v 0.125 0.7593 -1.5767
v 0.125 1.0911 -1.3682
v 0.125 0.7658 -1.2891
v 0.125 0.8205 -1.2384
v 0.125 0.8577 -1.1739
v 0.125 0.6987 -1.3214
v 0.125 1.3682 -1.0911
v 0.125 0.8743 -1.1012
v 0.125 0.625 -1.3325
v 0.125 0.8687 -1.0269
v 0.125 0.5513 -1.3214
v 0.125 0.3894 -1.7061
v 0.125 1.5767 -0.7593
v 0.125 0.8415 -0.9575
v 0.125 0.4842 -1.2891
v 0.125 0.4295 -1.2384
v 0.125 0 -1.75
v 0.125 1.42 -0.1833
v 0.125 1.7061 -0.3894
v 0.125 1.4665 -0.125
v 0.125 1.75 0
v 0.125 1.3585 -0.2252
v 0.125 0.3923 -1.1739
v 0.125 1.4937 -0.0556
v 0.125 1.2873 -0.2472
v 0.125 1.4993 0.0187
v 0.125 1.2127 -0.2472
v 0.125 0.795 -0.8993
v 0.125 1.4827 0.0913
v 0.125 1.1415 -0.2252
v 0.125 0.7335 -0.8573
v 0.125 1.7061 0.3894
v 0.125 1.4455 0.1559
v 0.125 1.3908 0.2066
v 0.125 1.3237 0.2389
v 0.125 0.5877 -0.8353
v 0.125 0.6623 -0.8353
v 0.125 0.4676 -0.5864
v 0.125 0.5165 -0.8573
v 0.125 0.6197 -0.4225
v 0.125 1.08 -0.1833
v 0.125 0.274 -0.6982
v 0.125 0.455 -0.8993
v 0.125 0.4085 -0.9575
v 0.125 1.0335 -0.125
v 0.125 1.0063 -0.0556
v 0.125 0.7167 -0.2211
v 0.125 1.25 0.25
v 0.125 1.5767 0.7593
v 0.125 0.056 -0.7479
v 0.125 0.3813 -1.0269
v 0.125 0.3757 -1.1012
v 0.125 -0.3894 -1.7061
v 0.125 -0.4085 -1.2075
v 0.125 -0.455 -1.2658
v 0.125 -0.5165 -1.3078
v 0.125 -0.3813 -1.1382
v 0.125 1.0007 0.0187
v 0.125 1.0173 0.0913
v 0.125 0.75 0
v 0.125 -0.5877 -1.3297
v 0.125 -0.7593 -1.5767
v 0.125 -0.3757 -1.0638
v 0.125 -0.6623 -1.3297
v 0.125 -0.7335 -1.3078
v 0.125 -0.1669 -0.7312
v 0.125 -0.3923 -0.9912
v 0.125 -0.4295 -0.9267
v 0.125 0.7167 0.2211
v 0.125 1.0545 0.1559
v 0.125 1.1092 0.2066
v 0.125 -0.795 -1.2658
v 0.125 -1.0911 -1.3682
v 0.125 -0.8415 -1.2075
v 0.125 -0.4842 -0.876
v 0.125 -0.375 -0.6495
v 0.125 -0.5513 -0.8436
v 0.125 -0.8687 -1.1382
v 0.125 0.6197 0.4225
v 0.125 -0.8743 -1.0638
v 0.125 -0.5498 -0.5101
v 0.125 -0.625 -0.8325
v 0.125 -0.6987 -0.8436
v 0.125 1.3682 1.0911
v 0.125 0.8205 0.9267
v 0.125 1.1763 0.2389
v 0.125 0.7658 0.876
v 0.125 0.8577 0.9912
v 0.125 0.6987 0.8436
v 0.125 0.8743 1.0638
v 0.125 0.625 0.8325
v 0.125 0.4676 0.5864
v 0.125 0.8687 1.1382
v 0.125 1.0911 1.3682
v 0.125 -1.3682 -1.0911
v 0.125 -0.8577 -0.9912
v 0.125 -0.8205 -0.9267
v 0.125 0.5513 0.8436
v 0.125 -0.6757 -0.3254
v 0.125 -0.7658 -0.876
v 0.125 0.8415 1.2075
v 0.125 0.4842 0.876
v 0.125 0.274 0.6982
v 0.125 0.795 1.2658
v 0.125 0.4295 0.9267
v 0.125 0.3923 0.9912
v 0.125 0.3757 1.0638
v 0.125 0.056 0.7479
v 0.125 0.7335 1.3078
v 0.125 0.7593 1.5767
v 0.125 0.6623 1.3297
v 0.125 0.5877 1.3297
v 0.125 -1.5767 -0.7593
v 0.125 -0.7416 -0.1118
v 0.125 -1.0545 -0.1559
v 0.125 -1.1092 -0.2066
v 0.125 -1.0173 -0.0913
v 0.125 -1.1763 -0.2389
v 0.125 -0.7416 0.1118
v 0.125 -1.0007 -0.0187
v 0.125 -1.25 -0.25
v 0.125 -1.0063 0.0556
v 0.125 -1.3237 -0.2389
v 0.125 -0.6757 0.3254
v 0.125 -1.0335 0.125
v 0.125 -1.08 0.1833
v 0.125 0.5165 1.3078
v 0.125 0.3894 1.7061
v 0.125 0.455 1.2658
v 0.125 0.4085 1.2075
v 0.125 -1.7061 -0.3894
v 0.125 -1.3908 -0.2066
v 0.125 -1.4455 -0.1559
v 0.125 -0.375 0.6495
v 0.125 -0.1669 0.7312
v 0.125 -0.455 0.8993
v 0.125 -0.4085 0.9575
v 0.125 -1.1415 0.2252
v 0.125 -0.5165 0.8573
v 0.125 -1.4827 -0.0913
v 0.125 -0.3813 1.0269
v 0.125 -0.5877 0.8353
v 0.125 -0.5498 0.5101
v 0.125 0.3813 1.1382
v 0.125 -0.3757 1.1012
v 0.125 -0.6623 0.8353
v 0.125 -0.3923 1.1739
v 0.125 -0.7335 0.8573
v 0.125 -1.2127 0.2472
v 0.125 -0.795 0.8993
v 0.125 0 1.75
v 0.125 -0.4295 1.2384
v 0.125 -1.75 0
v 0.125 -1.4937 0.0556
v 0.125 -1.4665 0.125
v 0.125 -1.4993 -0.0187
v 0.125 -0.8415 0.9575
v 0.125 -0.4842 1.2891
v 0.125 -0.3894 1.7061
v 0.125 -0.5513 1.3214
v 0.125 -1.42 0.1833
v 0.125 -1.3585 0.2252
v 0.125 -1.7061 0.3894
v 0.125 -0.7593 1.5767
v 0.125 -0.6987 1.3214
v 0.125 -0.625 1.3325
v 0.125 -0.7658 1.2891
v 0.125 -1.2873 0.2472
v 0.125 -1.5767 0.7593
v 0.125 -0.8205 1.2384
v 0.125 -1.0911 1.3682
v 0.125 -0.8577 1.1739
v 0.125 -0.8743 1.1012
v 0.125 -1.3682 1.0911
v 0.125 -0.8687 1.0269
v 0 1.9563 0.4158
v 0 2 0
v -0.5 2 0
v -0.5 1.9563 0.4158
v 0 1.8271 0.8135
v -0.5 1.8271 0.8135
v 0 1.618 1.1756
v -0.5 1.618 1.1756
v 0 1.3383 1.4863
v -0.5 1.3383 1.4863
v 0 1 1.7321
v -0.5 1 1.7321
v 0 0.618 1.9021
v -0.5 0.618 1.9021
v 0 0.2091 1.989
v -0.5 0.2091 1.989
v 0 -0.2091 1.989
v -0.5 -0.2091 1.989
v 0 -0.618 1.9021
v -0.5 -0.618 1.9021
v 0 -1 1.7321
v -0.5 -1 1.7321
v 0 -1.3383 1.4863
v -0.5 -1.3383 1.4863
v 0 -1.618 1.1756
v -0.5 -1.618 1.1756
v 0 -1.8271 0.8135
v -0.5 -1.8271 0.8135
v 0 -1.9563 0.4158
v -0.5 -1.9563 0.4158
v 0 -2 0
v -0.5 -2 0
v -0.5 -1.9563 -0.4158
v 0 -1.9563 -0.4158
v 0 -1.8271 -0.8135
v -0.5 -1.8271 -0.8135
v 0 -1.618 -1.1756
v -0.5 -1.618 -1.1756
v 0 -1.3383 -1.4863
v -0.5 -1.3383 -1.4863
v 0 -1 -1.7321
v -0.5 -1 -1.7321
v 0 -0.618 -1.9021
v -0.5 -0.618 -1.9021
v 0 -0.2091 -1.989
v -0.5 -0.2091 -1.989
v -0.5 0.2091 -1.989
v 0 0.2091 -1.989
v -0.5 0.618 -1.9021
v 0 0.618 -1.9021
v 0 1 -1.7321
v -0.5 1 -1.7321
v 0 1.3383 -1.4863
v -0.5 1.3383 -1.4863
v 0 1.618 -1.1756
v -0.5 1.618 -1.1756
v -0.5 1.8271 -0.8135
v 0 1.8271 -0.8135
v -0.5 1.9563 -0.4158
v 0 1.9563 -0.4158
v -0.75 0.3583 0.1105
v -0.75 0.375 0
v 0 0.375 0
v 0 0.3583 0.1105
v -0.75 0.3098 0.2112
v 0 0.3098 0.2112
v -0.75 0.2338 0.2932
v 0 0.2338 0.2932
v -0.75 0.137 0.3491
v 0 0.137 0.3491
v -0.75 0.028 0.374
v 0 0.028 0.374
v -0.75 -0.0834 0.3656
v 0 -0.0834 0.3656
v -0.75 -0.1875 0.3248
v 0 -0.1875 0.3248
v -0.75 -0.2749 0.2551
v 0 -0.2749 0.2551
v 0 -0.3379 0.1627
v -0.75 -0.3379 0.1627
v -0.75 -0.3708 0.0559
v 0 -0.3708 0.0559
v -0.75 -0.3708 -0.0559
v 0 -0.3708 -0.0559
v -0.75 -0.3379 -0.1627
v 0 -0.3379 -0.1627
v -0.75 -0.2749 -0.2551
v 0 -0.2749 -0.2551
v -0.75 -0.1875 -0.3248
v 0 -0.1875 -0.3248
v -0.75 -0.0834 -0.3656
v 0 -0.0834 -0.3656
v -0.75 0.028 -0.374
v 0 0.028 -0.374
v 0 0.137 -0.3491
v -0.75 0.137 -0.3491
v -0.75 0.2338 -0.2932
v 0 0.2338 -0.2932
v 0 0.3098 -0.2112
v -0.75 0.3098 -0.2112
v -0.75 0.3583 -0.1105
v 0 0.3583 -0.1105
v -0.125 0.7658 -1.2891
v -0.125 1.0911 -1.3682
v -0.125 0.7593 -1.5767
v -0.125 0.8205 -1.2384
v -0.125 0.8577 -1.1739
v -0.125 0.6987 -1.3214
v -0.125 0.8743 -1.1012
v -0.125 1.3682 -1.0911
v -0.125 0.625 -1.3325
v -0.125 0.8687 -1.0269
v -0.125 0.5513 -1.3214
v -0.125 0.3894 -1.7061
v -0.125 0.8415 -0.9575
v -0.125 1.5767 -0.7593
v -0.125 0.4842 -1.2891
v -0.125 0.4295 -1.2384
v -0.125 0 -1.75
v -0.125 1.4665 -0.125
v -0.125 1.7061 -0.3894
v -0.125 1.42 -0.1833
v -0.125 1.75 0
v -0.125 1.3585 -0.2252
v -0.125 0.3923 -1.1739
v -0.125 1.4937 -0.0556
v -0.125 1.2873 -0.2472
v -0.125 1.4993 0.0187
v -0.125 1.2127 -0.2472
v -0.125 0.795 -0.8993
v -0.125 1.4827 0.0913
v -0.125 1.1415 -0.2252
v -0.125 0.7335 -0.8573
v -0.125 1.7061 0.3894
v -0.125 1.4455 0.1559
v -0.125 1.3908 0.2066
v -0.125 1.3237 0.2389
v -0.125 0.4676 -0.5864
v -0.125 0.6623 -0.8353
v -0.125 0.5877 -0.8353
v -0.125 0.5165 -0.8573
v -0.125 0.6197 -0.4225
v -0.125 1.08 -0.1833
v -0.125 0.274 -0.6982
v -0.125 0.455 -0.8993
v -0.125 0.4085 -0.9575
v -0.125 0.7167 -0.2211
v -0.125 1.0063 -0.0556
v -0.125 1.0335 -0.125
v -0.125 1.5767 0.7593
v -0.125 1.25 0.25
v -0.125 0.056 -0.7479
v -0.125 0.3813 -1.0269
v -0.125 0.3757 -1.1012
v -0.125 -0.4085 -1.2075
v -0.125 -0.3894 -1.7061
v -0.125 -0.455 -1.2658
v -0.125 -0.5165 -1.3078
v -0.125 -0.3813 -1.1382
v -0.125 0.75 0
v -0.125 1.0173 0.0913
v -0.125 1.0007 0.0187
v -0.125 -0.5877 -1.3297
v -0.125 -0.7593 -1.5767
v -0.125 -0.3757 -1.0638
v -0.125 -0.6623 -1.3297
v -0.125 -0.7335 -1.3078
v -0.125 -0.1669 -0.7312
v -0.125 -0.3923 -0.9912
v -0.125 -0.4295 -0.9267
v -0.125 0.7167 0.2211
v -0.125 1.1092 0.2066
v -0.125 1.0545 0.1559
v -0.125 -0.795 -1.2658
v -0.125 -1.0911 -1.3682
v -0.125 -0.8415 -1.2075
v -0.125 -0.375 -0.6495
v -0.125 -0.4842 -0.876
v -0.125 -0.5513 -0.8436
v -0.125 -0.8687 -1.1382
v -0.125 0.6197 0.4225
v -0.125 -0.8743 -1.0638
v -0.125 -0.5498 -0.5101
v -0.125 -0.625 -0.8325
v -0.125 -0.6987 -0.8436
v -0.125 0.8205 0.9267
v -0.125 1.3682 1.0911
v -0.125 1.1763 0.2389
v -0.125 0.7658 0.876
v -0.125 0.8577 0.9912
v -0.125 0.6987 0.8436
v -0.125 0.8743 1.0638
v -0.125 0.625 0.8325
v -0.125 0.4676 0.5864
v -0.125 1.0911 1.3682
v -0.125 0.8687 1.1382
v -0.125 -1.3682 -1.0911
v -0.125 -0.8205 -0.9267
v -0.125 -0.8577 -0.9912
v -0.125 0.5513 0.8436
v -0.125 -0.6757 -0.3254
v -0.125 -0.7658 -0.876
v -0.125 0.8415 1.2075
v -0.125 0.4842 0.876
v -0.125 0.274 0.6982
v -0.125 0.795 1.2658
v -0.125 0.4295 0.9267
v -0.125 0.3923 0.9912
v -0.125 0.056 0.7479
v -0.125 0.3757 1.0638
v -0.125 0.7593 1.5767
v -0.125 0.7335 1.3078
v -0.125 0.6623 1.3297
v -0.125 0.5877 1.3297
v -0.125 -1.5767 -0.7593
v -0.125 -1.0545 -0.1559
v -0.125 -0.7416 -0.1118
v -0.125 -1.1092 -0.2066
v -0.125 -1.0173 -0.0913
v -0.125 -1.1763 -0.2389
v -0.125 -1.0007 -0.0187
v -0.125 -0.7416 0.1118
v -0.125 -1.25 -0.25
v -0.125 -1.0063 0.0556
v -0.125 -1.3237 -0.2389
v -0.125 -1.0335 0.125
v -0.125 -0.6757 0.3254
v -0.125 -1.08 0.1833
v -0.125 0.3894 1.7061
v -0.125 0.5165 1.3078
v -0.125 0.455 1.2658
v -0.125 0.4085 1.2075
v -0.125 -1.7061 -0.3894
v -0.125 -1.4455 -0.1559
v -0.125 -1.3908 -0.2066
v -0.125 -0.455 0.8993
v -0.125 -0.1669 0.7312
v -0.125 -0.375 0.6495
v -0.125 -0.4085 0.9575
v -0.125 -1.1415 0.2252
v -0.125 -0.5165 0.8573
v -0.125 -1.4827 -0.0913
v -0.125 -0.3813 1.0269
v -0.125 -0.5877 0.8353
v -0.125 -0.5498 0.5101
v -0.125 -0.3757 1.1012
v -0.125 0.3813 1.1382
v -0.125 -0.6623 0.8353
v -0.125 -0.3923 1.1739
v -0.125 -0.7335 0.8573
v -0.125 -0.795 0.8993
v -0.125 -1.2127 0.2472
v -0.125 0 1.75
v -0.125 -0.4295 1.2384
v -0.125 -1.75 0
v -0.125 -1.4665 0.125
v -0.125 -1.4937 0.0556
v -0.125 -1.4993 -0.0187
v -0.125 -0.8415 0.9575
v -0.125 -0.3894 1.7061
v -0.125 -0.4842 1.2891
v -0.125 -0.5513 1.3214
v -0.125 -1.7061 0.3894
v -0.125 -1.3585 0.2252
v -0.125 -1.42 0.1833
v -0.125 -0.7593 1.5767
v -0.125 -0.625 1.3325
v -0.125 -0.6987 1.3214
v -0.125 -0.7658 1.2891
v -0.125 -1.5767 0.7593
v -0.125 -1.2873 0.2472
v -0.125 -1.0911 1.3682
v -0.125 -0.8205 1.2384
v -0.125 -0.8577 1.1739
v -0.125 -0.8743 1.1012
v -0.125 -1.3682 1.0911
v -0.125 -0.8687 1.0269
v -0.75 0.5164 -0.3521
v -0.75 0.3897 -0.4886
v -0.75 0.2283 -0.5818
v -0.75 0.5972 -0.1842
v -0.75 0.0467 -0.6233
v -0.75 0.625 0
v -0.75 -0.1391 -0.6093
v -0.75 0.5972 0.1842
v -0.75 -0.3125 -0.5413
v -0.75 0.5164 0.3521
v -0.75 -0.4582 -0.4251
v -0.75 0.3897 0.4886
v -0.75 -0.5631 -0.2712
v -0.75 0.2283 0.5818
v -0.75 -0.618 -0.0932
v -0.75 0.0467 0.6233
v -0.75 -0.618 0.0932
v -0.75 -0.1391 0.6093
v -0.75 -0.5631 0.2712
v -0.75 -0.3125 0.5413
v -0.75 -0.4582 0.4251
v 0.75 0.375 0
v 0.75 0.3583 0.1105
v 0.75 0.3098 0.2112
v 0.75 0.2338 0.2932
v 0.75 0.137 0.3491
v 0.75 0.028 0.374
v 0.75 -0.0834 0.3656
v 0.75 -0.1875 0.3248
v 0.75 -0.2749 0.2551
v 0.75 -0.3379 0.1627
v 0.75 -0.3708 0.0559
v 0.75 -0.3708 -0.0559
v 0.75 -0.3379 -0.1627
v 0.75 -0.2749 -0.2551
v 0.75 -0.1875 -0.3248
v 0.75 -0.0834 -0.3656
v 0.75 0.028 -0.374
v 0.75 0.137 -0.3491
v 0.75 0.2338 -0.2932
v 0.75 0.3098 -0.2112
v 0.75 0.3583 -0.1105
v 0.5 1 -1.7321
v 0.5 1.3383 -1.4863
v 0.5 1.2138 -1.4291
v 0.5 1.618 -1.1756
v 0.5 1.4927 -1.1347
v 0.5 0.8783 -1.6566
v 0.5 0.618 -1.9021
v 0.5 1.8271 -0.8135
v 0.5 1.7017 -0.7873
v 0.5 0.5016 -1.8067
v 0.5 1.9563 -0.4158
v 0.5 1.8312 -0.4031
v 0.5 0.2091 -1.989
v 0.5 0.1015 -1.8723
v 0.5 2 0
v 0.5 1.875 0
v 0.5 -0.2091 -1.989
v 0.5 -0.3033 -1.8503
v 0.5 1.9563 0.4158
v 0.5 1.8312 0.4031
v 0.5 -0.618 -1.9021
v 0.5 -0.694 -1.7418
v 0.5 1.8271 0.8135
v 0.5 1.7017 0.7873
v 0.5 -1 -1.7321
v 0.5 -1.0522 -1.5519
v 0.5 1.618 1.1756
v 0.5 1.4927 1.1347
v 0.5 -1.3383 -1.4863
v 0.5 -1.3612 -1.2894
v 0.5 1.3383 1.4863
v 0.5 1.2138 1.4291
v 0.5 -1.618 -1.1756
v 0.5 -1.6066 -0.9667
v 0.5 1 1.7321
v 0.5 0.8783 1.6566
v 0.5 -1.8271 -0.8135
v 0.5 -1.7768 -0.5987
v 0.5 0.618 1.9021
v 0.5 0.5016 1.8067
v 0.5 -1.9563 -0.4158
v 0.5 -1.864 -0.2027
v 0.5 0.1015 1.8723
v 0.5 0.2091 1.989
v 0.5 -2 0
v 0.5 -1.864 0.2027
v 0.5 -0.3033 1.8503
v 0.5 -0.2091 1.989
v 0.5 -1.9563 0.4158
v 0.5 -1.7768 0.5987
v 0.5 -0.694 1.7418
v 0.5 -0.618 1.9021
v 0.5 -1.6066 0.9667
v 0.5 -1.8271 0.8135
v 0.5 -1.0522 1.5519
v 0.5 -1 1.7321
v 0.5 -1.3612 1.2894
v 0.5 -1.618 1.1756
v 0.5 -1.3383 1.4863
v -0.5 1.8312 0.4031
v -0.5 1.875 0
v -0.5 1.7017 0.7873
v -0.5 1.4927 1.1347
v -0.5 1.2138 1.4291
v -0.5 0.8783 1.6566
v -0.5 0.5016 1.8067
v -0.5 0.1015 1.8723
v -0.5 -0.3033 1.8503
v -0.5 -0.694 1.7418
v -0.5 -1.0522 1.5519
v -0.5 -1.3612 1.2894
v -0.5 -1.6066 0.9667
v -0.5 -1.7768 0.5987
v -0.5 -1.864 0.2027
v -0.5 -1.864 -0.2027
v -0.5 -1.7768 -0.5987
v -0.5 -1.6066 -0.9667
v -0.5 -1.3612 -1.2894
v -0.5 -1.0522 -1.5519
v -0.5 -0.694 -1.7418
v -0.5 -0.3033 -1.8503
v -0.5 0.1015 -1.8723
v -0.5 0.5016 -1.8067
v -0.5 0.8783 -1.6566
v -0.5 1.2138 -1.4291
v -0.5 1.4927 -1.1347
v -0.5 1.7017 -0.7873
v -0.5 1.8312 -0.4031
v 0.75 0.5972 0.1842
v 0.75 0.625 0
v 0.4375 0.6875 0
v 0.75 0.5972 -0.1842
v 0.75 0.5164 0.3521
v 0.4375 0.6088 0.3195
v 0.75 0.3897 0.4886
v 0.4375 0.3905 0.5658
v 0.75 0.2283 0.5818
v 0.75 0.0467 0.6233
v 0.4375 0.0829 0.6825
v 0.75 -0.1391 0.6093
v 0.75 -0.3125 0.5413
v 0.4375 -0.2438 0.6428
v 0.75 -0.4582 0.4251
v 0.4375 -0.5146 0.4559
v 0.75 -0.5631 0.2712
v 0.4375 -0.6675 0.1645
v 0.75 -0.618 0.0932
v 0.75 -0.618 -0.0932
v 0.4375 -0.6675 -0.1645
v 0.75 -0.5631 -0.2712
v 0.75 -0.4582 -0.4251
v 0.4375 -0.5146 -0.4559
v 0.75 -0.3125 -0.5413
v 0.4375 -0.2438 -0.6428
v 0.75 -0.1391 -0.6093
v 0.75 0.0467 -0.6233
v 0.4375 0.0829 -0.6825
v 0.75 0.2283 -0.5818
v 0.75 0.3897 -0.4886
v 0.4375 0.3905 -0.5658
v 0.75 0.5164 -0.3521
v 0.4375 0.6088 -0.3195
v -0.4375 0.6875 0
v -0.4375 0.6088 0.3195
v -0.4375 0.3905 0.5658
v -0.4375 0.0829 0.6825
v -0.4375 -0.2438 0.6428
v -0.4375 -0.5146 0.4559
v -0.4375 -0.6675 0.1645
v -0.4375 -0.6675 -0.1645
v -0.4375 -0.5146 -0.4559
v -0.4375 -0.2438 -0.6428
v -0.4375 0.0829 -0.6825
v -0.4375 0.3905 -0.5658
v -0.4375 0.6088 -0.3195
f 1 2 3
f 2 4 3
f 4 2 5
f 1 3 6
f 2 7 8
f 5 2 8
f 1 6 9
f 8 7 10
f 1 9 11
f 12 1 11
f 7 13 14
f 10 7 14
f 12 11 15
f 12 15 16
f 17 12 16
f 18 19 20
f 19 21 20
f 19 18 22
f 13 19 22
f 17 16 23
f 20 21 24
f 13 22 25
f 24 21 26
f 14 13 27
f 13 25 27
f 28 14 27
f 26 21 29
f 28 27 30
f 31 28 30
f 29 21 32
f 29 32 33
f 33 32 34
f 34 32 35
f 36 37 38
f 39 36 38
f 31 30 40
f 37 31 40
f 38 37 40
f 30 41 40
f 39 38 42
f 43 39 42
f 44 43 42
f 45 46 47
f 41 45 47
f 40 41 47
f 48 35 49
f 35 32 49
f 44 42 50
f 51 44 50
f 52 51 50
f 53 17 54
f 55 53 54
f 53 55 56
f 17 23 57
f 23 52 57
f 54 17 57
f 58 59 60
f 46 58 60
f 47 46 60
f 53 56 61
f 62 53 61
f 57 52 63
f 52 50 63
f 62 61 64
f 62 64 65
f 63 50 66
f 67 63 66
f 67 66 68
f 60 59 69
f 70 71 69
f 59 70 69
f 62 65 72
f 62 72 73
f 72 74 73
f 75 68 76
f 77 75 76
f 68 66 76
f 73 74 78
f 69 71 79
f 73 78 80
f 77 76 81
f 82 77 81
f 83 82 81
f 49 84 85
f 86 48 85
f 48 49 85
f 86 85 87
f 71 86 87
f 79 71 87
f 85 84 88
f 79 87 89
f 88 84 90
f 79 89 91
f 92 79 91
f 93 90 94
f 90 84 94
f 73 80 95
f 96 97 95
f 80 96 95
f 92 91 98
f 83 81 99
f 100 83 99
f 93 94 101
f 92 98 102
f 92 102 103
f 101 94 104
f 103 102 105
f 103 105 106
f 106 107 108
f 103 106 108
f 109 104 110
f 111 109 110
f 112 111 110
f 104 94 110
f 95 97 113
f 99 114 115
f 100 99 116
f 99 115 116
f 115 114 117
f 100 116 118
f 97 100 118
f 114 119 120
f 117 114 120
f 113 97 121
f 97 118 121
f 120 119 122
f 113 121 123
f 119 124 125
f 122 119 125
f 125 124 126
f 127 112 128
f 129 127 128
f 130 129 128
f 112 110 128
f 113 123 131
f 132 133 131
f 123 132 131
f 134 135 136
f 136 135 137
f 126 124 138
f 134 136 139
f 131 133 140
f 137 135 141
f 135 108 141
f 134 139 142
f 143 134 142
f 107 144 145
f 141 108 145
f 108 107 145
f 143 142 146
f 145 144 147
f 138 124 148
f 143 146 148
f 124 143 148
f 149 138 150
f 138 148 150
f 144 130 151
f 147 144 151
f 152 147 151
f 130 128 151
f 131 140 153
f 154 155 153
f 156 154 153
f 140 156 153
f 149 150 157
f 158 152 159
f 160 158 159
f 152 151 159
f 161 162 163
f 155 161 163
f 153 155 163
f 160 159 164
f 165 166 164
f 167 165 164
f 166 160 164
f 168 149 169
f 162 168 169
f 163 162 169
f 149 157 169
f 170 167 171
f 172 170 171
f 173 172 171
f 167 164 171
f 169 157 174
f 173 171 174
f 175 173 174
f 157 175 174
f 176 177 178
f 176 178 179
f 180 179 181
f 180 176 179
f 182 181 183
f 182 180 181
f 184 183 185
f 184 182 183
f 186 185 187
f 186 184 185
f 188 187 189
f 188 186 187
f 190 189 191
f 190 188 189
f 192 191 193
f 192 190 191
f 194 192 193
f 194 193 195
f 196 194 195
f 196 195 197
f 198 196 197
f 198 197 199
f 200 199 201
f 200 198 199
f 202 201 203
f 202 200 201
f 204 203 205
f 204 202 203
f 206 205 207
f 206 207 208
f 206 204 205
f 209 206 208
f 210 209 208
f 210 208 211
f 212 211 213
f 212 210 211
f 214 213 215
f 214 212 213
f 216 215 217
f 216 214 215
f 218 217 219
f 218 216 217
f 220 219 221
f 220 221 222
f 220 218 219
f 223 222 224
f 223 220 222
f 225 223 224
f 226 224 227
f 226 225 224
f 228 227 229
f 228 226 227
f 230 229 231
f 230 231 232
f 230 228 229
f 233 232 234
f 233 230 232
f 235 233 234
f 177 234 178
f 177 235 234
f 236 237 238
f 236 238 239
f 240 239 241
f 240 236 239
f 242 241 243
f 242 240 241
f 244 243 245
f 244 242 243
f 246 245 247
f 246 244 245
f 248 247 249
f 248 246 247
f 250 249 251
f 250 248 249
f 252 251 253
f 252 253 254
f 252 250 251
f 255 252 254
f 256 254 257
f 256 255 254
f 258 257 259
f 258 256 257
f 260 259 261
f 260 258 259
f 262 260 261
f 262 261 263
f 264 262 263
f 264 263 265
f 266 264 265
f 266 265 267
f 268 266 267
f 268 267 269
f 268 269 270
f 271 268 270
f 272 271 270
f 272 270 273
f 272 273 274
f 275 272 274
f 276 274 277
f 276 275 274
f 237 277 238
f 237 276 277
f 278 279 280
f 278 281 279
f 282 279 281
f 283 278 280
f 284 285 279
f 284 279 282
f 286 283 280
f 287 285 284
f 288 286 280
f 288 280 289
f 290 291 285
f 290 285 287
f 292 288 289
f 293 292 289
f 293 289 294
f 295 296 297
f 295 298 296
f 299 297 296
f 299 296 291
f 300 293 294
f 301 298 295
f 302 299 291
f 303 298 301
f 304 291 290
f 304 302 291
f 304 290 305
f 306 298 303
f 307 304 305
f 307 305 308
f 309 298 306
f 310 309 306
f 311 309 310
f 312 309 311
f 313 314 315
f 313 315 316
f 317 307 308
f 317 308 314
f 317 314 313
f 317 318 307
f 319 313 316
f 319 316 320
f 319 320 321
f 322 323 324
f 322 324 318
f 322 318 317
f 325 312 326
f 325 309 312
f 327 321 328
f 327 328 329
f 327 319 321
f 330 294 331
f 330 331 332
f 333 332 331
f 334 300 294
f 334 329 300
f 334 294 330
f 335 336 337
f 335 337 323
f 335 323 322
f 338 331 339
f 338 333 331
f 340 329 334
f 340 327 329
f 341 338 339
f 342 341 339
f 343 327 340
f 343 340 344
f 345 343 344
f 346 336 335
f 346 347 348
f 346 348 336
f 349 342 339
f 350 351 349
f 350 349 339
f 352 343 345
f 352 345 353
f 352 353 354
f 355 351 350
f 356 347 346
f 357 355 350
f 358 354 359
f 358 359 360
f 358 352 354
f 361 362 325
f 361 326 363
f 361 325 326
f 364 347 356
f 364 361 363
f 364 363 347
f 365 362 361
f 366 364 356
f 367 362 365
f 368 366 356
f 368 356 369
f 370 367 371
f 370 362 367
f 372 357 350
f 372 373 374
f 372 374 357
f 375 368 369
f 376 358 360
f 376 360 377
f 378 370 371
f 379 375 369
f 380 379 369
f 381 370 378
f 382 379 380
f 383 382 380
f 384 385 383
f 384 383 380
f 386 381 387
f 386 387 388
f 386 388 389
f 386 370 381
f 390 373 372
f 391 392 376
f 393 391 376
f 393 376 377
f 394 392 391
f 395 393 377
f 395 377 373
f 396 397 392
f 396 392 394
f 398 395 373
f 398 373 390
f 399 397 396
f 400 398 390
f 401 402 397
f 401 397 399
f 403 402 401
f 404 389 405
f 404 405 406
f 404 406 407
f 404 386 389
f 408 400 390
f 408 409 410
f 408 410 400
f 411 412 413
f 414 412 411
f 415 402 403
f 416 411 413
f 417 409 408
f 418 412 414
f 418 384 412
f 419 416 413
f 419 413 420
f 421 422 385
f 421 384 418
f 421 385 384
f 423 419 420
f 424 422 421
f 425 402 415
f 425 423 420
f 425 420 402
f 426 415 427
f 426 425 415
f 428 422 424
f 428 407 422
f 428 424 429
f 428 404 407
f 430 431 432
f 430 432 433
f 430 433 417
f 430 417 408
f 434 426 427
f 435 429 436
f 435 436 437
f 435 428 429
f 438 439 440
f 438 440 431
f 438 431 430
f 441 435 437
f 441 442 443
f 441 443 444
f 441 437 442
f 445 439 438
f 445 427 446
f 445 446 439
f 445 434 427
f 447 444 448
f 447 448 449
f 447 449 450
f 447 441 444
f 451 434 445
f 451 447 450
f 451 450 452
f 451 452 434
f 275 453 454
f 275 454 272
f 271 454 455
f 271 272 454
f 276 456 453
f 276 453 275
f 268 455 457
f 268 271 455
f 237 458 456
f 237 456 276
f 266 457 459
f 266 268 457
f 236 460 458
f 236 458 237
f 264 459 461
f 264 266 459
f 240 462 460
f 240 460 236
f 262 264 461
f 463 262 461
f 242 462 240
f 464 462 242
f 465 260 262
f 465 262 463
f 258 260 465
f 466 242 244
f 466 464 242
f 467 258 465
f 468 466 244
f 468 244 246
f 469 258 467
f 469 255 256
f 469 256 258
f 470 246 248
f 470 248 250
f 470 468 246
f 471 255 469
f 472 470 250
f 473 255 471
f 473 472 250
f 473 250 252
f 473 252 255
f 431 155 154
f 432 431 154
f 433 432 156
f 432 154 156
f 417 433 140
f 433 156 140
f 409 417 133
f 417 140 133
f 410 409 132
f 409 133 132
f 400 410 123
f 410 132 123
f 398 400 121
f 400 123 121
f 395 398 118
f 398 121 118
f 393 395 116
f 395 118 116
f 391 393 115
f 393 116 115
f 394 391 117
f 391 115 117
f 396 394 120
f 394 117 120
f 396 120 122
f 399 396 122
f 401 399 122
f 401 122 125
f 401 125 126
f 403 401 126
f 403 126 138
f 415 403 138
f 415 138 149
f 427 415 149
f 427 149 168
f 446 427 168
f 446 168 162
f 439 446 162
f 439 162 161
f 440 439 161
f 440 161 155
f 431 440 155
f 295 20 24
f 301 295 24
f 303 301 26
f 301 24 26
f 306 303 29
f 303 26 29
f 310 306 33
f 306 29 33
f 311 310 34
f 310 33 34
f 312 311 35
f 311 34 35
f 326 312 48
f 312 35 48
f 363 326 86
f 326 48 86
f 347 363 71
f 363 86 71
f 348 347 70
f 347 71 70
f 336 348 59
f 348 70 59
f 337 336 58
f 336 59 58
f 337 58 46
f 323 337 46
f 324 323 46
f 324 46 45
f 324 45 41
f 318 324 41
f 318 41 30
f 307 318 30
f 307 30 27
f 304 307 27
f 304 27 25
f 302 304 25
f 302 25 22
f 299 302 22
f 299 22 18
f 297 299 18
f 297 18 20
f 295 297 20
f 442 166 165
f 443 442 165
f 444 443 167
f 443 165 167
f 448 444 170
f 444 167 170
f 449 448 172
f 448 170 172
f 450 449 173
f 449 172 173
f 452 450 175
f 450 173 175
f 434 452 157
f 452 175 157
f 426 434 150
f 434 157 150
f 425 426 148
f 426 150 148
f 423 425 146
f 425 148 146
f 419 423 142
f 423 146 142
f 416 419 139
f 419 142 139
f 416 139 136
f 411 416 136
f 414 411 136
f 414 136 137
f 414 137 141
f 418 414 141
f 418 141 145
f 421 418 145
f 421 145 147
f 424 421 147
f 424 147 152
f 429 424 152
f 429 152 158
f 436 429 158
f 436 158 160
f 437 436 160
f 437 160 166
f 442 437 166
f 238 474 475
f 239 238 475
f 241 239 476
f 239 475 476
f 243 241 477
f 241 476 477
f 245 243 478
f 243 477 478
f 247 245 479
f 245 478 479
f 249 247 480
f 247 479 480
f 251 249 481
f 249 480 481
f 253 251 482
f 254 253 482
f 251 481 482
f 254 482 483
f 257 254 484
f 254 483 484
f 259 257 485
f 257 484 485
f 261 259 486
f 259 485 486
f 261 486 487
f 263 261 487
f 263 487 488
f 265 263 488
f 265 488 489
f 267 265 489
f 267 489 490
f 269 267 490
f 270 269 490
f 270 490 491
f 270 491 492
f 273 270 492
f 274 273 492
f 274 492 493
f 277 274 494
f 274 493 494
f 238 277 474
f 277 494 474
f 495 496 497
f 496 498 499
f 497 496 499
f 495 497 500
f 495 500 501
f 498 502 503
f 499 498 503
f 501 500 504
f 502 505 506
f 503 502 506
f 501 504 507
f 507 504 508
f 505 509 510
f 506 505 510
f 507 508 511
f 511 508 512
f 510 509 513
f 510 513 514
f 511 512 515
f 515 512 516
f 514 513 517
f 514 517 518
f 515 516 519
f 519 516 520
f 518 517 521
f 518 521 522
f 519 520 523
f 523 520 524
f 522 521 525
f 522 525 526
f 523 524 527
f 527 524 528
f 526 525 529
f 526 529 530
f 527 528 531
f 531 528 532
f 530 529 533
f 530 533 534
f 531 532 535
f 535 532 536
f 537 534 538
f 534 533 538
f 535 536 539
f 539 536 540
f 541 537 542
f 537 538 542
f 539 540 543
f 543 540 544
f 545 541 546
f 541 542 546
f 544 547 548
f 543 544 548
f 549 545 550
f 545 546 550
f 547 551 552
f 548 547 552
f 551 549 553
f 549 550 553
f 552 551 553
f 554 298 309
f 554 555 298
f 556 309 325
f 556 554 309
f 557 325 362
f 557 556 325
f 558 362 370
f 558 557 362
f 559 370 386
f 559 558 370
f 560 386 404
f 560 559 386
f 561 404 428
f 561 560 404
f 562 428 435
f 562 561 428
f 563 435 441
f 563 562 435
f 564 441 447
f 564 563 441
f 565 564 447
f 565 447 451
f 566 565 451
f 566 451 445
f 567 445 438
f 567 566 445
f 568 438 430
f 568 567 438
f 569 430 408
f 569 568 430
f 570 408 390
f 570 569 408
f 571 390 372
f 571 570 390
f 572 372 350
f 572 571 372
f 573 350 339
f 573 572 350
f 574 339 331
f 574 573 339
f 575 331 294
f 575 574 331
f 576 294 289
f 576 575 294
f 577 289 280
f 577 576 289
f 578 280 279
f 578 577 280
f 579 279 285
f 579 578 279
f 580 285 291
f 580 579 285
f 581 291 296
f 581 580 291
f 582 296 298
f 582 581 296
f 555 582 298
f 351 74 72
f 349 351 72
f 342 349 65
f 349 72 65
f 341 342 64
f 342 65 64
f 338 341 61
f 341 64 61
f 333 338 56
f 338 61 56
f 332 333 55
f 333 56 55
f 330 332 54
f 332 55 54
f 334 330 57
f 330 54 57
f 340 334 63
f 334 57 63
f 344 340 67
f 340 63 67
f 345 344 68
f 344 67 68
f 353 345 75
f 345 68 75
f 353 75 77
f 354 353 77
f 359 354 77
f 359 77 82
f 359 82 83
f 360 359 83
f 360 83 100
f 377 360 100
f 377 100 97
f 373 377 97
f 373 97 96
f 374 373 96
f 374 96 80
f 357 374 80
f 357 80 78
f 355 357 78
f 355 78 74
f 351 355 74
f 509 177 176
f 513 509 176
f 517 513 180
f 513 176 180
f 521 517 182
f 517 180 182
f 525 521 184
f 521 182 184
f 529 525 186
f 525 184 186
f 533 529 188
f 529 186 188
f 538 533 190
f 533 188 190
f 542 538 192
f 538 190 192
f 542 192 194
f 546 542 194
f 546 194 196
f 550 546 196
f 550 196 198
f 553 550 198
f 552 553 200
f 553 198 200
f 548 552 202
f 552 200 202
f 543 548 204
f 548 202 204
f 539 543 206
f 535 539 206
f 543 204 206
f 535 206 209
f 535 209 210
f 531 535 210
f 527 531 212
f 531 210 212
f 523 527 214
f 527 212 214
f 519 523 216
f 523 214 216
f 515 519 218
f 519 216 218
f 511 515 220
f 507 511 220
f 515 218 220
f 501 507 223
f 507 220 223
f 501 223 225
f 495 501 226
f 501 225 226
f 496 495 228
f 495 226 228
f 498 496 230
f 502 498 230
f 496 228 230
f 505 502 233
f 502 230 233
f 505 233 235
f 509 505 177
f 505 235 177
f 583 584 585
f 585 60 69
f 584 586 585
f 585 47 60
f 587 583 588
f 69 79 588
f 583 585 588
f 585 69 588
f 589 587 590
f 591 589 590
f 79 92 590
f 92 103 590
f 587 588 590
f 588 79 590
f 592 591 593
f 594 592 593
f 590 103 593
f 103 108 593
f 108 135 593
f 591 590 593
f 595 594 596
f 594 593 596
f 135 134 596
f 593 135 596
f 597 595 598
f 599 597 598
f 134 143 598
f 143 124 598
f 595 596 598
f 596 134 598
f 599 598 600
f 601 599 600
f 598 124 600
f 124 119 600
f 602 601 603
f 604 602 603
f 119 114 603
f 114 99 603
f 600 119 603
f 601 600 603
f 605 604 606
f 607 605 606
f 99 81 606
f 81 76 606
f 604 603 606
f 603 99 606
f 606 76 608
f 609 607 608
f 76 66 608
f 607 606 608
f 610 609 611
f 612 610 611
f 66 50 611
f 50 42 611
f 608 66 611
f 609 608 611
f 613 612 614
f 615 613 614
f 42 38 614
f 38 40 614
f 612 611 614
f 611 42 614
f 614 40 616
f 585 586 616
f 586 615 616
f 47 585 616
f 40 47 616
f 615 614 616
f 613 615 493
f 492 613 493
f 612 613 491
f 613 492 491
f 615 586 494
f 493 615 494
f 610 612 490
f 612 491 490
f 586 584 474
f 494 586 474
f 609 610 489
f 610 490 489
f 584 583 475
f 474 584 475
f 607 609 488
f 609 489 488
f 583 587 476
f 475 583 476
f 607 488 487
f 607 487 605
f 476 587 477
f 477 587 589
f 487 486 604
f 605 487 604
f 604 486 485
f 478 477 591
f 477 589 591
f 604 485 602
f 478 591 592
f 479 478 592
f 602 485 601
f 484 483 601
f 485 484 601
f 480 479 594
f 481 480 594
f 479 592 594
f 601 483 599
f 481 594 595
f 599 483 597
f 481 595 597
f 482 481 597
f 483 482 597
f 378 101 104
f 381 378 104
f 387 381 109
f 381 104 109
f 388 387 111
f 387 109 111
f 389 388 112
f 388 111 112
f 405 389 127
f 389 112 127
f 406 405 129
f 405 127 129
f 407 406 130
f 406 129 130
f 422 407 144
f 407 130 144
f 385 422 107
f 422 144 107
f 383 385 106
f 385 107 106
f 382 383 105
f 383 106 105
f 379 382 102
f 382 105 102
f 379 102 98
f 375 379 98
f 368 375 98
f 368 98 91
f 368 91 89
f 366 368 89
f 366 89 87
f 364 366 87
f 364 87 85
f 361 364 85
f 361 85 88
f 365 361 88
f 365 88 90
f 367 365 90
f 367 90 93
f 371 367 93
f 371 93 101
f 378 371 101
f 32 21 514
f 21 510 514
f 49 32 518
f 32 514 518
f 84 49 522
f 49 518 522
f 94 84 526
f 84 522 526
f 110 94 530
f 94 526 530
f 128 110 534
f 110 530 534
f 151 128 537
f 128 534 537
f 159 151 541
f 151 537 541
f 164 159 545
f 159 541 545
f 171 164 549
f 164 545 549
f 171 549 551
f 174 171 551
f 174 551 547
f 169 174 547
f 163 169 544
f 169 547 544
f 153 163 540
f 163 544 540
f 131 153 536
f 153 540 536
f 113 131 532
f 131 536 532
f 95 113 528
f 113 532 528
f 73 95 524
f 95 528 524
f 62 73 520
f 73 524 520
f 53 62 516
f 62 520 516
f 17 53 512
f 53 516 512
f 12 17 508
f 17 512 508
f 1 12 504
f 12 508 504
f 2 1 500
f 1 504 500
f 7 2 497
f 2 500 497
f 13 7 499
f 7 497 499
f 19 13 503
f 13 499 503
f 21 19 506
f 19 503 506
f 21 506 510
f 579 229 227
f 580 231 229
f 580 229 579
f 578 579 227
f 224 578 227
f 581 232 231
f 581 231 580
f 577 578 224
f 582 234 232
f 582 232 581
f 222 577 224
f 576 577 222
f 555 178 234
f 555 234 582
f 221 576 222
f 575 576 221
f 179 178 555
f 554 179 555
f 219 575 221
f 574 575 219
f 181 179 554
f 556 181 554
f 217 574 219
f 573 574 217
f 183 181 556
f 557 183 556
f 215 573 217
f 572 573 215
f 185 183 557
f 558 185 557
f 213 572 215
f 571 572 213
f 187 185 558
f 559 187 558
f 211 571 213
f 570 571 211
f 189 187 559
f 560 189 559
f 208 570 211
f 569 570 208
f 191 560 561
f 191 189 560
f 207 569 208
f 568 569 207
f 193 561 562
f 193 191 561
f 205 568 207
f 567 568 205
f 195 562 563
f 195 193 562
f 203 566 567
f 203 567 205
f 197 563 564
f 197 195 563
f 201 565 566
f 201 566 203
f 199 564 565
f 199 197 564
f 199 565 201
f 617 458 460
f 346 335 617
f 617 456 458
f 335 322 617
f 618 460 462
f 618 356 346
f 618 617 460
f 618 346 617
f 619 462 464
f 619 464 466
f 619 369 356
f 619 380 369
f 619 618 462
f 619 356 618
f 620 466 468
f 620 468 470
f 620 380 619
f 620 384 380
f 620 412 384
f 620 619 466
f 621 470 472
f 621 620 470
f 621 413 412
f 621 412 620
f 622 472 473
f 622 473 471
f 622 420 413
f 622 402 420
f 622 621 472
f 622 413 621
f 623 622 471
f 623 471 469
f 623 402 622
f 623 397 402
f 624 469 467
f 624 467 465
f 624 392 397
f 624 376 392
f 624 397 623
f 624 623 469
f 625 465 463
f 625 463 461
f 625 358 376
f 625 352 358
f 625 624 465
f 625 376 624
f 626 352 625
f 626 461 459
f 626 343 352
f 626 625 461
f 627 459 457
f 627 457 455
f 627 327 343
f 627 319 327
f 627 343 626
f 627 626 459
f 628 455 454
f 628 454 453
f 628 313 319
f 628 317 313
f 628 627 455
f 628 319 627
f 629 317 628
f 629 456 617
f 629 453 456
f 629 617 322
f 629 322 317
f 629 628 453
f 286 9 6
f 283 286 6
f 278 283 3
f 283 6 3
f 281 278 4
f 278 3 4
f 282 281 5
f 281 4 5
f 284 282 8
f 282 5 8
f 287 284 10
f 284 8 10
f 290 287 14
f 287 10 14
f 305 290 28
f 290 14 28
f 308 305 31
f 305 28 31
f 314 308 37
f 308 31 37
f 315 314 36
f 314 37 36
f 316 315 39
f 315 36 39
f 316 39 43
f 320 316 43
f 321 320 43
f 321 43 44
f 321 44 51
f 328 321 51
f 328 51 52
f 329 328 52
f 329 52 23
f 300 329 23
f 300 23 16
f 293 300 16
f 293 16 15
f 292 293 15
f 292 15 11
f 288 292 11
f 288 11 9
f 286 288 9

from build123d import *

# Parameters (mm, degrees)
SKETCH2_R          = 0.25
CUT_EXTRUDE2_DEPTH = 1.875
CIRPATTERN2_COUNT  = 6


with BuildPart() as part:
    # Sketch1 → Revolve1 (revolve)
    with BuildSketch(Plane.XY):
        Polygon((0, 0.375), (0.75, 0.375), (0.75, 0.625), (0.125, 0.75), (0.125, 1.75), (0.5, 1.875), (0.5, 2), (0, 2), align=None)
    revolve1 = revolve(axis=Axis((0, 0, 0), (1, 0, 0)))

    # Mirror1: Revolve1 across plane
    add(revolve1.mirror(Plane(origin=(0, 2, 0), x_dir=(0, 0, 1), z_dir=(1, 0, 0))))

    # Sketch2 → Cut-Extrude2 (cut, through all)
    with BuildSketch(Plane(origin=(0.125, 0, 0), x_dir=(0, 0, -1), z_dir=(1, 0, 0))):
        with Locations((1.082531755, 0.625)):
            Circle(SKETCH2_R)
    cut_extrude2 = extrude(amount=-CUT_EXTRUDE2_DEPTH, mode=Mode.SUBTRACT)

    # CirPattern2: Cut-Extrude2 ×6 about axis
    cirpattern2_axis = Axis((0, 0, 0), (1, 0, 0))
    for i in range(1, CIRPATTERN2_COUNT):
        add(cut_extrude2.rotate(cirpattern2_axis, i * 360 / CIRPATTERN2_COUNT), mode=Mode.SUBTRACT)


solid = part.part
